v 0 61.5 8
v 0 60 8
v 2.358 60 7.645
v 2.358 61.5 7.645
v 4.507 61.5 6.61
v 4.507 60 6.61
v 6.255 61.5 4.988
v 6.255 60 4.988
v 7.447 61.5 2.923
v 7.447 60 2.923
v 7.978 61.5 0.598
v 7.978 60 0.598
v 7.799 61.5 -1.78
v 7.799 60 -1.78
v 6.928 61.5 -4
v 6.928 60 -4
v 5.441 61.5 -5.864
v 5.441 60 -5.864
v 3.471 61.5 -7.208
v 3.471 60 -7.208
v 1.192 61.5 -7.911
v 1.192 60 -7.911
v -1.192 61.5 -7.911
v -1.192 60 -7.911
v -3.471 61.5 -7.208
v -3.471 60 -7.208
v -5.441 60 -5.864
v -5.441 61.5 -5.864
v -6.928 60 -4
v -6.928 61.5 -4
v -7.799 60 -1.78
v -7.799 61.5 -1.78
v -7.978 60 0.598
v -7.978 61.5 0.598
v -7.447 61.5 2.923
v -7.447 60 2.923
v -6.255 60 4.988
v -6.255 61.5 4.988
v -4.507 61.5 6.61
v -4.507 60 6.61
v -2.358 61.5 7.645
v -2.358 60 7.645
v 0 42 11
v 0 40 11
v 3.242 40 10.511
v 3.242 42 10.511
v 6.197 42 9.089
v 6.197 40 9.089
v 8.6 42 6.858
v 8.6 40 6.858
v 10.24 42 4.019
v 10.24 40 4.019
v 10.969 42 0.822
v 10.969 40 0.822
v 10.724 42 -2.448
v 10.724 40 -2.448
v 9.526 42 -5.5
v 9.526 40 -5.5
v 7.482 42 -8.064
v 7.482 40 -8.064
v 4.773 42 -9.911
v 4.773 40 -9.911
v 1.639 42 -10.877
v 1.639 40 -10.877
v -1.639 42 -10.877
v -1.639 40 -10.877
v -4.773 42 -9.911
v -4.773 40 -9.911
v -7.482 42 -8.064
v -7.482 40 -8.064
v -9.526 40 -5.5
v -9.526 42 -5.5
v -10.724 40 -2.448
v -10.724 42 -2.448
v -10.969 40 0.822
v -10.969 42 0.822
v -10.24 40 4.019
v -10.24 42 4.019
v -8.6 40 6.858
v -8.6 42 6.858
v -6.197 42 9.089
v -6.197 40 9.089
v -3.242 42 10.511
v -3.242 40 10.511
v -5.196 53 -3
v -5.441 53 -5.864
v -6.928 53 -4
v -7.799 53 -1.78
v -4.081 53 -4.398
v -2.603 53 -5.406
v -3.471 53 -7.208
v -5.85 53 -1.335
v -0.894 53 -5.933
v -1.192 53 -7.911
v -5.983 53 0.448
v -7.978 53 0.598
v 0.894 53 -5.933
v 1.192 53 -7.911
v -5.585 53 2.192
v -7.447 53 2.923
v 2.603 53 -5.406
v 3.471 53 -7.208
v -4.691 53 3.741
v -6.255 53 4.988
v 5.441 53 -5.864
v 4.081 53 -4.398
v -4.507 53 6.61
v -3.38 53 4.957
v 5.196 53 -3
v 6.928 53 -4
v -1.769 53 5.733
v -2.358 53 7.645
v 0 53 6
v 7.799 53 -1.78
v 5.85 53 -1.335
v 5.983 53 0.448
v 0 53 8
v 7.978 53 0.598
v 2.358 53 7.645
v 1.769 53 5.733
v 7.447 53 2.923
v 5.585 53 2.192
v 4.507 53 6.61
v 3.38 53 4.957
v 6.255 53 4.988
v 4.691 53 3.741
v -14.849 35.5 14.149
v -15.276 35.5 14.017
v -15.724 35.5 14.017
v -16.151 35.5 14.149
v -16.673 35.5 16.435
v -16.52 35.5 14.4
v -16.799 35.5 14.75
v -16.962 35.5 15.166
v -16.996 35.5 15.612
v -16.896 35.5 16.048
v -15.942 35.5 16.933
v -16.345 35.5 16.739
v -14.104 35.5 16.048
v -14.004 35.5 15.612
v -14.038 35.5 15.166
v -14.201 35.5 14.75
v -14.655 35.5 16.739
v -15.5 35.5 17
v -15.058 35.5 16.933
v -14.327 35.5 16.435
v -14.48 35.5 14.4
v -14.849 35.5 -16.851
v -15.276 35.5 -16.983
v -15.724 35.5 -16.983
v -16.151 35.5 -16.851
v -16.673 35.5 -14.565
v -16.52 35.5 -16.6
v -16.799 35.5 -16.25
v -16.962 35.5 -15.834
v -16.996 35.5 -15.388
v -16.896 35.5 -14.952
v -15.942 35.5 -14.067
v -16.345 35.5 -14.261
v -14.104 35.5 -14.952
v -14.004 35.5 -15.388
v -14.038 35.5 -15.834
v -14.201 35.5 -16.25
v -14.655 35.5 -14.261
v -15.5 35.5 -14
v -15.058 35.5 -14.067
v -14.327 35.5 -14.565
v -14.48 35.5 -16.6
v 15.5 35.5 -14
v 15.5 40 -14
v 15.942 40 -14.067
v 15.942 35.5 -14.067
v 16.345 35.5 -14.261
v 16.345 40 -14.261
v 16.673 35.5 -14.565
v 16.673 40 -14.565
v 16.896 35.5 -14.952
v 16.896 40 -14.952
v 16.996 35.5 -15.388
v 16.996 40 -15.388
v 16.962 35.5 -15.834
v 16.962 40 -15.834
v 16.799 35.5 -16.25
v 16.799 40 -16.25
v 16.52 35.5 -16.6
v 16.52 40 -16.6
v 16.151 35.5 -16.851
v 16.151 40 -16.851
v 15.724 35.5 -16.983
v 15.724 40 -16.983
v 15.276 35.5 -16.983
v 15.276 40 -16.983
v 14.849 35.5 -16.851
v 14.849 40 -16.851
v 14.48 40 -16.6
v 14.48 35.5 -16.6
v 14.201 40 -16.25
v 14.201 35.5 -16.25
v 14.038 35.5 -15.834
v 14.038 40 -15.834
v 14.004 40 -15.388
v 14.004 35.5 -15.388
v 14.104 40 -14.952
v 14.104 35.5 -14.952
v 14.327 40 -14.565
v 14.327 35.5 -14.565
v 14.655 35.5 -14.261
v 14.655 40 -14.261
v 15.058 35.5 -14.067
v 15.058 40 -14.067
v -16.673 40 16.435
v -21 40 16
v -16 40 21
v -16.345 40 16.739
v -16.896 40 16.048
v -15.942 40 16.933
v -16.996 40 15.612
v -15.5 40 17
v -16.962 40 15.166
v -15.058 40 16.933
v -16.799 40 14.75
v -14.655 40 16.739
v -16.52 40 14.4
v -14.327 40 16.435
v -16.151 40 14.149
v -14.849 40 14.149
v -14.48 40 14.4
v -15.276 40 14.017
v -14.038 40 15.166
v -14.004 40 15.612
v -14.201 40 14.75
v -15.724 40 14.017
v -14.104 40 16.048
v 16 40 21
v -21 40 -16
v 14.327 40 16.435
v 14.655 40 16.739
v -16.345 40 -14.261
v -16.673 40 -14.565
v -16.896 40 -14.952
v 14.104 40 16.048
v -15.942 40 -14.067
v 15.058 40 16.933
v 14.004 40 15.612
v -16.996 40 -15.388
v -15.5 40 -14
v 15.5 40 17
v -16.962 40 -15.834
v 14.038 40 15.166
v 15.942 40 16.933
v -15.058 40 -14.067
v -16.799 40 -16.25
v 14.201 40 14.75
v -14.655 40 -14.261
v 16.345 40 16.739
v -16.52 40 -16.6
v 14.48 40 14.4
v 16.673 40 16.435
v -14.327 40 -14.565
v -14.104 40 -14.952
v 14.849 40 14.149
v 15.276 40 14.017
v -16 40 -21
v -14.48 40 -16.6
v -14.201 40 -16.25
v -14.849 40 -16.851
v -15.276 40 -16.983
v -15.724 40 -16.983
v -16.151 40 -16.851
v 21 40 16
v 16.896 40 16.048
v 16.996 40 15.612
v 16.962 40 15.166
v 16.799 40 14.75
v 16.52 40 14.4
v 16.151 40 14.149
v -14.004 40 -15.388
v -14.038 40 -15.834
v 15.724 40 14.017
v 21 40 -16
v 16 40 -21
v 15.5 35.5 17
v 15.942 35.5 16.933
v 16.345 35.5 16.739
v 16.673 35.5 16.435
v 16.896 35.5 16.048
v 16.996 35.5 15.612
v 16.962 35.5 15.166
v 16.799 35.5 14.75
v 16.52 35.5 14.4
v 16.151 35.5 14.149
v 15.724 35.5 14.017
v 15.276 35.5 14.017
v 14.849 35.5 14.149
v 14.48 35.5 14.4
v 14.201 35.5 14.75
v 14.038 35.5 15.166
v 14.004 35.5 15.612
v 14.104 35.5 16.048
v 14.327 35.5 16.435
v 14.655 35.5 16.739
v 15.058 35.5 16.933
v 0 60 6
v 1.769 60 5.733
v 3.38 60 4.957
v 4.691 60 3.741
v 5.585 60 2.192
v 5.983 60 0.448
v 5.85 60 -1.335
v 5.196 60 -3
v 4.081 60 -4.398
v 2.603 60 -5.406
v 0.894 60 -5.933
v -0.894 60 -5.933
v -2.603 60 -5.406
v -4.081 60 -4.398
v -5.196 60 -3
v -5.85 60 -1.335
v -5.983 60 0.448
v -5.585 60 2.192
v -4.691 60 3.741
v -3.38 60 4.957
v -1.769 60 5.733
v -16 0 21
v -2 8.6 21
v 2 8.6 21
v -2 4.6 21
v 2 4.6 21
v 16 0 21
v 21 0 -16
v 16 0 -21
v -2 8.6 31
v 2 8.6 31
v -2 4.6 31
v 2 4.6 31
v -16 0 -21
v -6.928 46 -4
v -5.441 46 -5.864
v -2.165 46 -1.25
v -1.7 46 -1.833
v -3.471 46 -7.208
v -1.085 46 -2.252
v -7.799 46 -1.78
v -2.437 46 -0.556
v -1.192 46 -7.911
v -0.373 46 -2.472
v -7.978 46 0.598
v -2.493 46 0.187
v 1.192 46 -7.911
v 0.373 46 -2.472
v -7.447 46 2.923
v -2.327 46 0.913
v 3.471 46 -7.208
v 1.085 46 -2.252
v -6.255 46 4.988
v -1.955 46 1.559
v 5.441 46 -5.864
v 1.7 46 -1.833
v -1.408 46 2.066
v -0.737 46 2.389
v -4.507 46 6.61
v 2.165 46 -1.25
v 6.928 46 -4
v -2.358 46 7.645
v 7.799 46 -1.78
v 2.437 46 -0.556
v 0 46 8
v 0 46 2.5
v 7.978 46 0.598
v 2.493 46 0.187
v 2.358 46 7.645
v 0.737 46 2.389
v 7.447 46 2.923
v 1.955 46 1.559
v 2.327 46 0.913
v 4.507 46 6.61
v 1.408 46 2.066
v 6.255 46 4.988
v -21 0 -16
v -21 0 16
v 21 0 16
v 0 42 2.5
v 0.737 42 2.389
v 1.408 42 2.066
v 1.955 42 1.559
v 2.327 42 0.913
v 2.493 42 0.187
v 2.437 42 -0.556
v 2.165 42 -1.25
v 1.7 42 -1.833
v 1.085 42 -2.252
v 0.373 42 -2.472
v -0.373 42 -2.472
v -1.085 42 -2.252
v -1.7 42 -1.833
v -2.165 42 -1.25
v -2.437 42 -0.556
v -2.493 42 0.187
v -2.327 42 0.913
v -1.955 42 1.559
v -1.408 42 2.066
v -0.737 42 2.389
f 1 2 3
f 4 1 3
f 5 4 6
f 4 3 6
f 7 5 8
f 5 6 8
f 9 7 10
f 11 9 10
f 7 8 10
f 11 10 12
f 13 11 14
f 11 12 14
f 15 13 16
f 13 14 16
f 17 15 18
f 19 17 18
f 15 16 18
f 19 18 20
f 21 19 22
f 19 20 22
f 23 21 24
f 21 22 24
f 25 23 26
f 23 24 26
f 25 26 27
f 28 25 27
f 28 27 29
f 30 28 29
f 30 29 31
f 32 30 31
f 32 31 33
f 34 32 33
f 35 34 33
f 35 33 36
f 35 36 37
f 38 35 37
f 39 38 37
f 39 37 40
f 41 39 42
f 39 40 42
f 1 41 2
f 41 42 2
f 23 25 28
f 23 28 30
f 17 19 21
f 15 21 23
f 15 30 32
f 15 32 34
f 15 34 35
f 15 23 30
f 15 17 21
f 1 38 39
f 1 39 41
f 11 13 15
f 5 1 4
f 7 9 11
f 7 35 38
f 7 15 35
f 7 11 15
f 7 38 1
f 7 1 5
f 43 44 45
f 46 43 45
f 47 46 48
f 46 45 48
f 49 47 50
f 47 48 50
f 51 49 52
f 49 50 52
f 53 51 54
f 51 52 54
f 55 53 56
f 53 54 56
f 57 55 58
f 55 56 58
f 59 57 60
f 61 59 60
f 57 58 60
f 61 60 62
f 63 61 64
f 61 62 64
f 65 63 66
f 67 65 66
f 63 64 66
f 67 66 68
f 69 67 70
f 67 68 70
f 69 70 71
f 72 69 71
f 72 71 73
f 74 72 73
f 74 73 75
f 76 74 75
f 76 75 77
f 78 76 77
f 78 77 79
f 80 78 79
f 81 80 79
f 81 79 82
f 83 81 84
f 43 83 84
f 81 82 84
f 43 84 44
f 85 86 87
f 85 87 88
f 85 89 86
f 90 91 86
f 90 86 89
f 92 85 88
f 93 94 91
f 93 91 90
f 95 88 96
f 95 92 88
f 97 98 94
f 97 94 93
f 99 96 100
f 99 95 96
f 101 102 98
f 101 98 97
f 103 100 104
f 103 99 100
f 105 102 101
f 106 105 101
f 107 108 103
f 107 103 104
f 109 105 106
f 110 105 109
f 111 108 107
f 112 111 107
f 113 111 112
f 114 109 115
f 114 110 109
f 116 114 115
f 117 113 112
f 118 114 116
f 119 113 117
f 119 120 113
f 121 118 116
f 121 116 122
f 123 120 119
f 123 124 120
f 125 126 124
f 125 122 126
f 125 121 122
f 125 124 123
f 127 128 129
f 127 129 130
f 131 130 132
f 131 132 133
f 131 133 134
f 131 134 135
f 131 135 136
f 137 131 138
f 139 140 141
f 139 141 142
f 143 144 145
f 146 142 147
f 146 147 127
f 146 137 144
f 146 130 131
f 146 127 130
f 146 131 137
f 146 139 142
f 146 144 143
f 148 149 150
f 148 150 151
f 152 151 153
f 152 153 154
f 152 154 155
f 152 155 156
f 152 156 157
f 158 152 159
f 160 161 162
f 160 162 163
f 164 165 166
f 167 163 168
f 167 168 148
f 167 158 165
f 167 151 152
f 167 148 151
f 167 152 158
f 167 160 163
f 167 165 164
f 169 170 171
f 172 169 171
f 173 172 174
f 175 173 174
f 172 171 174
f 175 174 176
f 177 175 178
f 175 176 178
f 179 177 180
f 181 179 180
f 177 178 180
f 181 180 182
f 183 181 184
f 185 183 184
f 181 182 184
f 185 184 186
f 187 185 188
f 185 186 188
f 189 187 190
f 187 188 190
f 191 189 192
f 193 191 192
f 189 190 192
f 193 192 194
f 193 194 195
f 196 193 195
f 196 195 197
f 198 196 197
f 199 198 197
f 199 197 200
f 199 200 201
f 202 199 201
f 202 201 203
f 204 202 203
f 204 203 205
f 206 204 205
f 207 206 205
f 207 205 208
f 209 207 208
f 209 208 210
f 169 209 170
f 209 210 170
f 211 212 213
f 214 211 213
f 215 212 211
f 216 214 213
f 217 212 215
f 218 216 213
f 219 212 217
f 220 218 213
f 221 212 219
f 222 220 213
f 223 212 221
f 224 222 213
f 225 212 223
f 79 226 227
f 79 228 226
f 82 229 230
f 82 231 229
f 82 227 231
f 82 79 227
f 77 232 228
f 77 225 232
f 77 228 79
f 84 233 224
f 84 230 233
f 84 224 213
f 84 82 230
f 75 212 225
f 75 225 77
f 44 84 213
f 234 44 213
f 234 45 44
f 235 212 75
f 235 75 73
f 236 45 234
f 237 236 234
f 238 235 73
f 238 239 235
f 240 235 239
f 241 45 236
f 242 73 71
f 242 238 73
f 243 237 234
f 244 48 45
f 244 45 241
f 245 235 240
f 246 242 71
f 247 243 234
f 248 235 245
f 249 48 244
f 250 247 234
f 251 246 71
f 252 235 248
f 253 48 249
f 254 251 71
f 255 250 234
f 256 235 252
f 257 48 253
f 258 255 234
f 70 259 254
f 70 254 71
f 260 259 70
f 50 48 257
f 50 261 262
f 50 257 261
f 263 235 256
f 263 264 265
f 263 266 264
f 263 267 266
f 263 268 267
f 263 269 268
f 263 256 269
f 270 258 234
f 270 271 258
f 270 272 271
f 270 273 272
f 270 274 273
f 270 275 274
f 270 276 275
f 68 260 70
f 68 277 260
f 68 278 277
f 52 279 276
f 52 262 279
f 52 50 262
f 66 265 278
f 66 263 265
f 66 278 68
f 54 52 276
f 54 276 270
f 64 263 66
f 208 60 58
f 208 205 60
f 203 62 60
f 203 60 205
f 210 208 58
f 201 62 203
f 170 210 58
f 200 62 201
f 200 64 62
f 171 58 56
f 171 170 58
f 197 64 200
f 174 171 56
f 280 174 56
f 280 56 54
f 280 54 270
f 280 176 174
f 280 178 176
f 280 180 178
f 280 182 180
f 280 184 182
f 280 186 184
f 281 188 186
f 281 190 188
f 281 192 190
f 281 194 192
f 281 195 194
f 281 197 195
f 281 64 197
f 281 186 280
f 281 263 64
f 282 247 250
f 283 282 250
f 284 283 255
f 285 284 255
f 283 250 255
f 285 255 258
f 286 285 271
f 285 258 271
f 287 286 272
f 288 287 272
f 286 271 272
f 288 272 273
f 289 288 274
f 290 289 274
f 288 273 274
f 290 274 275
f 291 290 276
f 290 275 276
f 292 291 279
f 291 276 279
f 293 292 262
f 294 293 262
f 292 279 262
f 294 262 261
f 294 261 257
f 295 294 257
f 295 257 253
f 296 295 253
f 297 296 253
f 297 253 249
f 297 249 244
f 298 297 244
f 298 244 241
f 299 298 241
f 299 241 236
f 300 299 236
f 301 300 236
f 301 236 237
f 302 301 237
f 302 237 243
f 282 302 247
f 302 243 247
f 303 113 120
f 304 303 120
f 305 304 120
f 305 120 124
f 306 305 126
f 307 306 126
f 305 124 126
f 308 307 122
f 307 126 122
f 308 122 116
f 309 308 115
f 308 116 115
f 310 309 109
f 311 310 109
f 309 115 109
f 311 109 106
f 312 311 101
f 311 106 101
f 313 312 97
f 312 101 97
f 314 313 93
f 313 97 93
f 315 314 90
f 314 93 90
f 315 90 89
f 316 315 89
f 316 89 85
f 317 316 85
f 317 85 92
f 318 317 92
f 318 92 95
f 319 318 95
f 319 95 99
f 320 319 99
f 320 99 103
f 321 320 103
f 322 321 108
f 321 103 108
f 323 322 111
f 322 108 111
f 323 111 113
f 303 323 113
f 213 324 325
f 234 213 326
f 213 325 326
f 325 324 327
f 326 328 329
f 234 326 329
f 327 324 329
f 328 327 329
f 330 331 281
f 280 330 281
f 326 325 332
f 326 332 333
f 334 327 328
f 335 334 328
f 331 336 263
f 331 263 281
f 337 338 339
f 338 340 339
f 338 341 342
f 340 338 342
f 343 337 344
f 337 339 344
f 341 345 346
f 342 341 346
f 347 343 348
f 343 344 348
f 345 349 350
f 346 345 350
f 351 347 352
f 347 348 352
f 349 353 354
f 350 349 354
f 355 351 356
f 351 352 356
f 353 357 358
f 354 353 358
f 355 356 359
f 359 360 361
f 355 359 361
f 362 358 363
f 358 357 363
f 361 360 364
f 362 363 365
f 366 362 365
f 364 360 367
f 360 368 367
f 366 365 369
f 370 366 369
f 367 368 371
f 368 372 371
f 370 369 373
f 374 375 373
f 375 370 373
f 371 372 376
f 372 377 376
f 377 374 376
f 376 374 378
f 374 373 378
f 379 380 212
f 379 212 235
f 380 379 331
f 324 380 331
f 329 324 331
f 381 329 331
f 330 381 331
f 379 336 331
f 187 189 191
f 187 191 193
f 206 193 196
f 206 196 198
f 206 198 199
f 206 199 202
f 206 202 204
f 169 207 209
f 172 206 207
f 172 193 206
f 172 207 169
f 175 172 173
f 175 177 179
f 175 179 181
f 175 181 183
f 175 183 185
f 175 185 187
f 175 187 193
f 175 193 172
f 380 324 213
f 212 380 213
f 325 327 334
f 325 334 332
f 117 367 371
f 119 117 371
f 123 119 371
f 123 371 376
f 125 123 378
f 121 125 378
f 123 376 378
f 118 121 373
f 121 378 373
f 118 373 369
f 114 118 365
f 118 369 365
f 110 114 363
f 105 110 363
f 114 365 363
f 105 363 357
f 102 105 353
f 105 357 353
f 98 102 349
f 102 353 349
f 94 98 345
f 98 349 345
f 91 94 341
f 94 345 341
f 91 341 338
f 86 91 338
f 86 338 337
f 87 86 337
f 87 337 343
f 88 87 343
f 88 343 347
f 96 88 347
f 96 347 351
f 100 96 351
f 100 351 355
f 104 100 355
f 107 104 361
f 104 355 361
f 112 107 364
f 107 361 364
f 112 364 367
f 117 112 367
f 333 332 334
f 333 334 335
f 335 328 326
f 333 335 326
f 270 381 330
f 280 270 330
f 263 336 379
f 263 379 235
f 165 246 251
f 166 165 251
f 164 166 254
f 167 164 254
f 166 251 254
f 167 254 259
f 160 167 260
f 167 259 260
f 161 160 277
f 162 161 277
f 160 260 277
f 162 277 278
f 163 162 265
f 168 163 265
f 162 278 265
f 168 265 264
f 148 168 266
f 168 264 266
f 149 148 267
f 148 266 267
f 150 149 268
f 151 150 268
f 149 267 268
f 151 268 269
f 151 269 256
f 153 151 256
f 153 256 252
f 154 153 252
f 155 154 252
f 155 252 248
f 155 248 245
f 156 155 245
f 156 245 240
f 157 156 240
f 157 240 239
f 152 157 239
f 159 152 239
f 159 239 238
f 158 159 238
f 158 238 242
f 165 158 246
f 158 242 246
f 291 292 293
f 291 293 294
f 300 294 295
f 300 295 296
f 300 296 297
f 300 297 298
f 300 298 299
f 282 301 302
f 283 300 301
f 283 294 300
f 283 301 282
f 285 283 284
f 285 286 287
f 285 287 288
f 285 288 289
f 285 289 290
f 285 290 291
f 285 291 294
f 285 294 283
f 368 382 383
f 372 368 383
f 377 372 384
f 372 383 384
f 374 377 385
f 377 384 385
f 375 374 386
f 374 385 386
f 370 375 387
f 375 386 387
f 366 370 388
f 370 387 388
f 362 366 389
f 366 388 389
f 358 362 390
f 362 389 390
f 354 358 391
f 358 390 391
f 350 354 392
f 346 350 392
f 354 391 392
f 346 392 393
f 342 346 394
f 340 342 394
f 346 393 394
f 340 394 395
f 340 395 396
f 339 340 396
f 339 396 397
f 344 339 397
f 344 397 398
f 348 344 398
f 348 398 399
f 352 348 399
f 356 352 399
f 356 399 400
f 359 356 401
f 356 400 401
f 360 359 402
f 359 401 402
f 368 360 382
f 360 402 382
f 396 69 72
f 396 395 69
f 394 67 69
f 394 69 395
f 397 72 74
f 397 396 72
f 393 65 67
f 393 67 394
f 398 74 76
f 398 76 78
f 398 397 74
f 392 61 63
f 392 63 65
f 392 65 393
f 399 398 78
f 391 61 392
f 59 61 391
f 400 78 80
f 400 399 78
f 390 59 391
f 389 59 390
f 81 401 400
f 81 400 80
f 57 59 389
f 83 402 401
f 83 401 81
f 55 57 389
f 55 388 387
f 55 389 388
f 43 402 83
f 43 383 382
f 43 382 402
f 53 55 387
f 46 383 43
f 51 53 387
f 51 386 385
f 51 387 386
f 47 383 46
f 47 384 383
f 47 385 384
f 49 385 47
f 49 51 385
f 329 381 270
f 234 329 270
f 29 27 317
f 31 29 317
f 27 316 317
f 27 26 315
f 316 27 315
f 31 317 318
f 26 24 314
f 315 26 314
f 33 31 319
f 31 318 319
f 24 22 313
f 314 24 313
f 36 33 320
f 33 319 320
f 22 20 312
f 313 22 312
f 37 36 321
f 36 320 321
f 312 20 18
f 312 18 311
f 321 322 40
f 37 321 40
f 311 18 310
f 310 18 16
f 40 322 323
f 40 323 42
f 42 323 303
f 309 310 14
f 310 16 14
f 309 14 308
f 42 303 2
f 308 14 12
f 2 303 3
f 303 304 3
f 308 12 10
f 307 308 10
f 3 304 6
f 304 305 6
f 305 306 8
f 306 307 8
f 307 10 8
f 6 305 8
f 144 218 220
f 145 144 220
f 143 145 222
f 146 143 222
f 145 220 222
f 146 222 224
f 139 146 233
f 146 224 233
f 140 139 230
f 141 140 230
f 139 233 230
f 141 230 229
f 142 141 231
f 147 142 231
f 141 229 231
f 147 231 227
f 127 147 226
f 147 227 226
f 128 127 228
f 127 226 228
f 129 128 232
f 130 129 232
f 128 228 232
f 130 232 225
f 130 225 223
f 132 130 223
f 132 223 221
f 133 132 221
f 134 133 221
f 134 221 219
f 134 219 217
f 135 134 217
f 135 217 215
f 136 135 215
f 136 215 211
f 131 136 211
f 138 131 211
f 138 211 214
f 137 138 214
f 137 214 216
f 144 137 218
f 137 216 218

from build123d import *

# Parameters (mm, degrees)
SKETCH1_W           = 42
SKETCH1_H           = 42
BOSS_EXTRUDE1_DEPTH = 40
CHAMFER1_SIZE       = 5
SKETCH2_R           = 11
BOSS_EXTRUDE3_DEPTH = 2
SKETCH5_R           = 2.5
BOSS_EXTRUDE4_DEPTH = 4
SKETCH6_R           = 8
BOSS_EXTRUDE5_DEPTH = 7
SKETCH7_R           = 6
BOSS_EXTRUDE6_DEPTH = 7
SKETCH8_R           = 8
BOSS_EXTRUDE7_DEPTH = 1.5
SKETCH9_R           = 1.5
CUT_EXTRUDE1_DEPTH  = 4.5
SKETCH10_W          = 4
SKETCH10_H          = 4
BOSS_EXTRUDE8_DEPTH = 10


with BuildPart() as part:
    # Sketch1 → Boss-Extrude1 (new body)
    with BuildSketch(Plane(origin=(0, 0, 0), x_dir=(1, 0, 0), z_dir=(0, 1, 0))):
        Rectangle(SKETCH1_W, SKETCH1_H)
    extrude(amount=BOSS_EXTRUDE1_DEPTH)

    # Chamfer1
    chamfer1_edges = [part.edges().sort_by_distance(p)[0] for p in [
        (21, 20, 21),
        (-21, 20, 21),
        (-21, 20, -21),
        (21, 20, -21),
    ]]
    chamfer(chamfer1_edges, length=CHAMFER1_SIZE)

    # Sketch2 → Boss-Extrude3 (add)
    with BuildSketch(Plane(origin=(0, 40, 0), x_dir=(1, 0, 0), z_dir=(0, 1, 0))):
        with Locations(Location((0, 0, 0), (0, 0, 270))):
            Circle(SKETCH2_R)
    extrude(amount=BOSS_EXTRUDE3_DEPTH)

    # Sketch5 → Boss-Extrude4 (add)
    with BuildSketch(Plane(origin=(0, 42, 0), x_dir=(1, 0, 0), z_dir=(0, 1, 0))):
        with Locations(Location((0, 0, 0), (0, 0, 270))):
            Circle(SKETCH5_R)
    extrude(amount=BOSS_EXTRUDE4_DEPTH)

    # Sketch6 → Boss-Extrude5 (add)
    with BuildSketch(Plane(origin=(0, 46, 0), x_dir=(1, 0, 0), z_dir=(0, 1, 0))):
        with Locations(Location((0, 0, 0), (0, 0, 270))):
            Circle(SKETCH6_R)
    extrude(amount=BOSS_EXTRUDE5_DEPTH)

    # Sketch7 → Boss-Extrude6 (add)
    with BuildSketch(Plane(origin=(0, 53, 0), x_dir=(1, 0, 0), z_dir=(0, 1, 0))):
        with Locations(Location((0, 0, 0), (0, 0, 270))):
            Circle(SKETCH7_R)
    extrude(amount=BOSS_EXTRUDE6_DEPTH)

    # Sketch8 → Boss-Extrude7 (add)
    with BuildSketch(Plane(origin=(0, 60, 0), x_dir=(1, 0, 0), z_dir=(0, 1, 0))):
        with Locations(Location((0, 0, 0), (0, 0, 270))):
            Circle(SKETCH8_R)
    extrude(amount=BOSS_EXTRUDE7_DEPTH)

    # Sketch9 → Cut-Extrude1 (cut)
    with BuildSketch(Plane(origin=(0, 40, 0), x_dir=(1, 0, 0), z_dir=(0, 1, 0))):
        with Locations(Location((-15.5, 15.5, 0), (0, 0, 270))):
            Circle(SKETCH9_R)
        with Locations(Location((15.5, 15.5, 0), (0, 0, 270))):
            Circle(SKETCH9_R)
        with Locations(Location((15.5, -15.5, 0), (0, 0, 270))):
            Circle(SKETCH9_R)
        with Locations(Location((-15.5, -15.5, 0), (0, 0, 270))):
            Circle(SKETCH9_R)
    extrude(amount=-CUT_EXTRUDE1_DEPTH, mode=Mode.SUBTRACT)

    # Sketch10 → Boss-Extrude8 (add)
    with BuildSketch(Plane.XY.offset(21)):
        with Locations((0, 6.6)):
            Rectangle(SKETCH10_W, SKETCH10_H)
    extrude(amount=BOSS_EXTRUDE8_DEPTH)


solid = part.part
